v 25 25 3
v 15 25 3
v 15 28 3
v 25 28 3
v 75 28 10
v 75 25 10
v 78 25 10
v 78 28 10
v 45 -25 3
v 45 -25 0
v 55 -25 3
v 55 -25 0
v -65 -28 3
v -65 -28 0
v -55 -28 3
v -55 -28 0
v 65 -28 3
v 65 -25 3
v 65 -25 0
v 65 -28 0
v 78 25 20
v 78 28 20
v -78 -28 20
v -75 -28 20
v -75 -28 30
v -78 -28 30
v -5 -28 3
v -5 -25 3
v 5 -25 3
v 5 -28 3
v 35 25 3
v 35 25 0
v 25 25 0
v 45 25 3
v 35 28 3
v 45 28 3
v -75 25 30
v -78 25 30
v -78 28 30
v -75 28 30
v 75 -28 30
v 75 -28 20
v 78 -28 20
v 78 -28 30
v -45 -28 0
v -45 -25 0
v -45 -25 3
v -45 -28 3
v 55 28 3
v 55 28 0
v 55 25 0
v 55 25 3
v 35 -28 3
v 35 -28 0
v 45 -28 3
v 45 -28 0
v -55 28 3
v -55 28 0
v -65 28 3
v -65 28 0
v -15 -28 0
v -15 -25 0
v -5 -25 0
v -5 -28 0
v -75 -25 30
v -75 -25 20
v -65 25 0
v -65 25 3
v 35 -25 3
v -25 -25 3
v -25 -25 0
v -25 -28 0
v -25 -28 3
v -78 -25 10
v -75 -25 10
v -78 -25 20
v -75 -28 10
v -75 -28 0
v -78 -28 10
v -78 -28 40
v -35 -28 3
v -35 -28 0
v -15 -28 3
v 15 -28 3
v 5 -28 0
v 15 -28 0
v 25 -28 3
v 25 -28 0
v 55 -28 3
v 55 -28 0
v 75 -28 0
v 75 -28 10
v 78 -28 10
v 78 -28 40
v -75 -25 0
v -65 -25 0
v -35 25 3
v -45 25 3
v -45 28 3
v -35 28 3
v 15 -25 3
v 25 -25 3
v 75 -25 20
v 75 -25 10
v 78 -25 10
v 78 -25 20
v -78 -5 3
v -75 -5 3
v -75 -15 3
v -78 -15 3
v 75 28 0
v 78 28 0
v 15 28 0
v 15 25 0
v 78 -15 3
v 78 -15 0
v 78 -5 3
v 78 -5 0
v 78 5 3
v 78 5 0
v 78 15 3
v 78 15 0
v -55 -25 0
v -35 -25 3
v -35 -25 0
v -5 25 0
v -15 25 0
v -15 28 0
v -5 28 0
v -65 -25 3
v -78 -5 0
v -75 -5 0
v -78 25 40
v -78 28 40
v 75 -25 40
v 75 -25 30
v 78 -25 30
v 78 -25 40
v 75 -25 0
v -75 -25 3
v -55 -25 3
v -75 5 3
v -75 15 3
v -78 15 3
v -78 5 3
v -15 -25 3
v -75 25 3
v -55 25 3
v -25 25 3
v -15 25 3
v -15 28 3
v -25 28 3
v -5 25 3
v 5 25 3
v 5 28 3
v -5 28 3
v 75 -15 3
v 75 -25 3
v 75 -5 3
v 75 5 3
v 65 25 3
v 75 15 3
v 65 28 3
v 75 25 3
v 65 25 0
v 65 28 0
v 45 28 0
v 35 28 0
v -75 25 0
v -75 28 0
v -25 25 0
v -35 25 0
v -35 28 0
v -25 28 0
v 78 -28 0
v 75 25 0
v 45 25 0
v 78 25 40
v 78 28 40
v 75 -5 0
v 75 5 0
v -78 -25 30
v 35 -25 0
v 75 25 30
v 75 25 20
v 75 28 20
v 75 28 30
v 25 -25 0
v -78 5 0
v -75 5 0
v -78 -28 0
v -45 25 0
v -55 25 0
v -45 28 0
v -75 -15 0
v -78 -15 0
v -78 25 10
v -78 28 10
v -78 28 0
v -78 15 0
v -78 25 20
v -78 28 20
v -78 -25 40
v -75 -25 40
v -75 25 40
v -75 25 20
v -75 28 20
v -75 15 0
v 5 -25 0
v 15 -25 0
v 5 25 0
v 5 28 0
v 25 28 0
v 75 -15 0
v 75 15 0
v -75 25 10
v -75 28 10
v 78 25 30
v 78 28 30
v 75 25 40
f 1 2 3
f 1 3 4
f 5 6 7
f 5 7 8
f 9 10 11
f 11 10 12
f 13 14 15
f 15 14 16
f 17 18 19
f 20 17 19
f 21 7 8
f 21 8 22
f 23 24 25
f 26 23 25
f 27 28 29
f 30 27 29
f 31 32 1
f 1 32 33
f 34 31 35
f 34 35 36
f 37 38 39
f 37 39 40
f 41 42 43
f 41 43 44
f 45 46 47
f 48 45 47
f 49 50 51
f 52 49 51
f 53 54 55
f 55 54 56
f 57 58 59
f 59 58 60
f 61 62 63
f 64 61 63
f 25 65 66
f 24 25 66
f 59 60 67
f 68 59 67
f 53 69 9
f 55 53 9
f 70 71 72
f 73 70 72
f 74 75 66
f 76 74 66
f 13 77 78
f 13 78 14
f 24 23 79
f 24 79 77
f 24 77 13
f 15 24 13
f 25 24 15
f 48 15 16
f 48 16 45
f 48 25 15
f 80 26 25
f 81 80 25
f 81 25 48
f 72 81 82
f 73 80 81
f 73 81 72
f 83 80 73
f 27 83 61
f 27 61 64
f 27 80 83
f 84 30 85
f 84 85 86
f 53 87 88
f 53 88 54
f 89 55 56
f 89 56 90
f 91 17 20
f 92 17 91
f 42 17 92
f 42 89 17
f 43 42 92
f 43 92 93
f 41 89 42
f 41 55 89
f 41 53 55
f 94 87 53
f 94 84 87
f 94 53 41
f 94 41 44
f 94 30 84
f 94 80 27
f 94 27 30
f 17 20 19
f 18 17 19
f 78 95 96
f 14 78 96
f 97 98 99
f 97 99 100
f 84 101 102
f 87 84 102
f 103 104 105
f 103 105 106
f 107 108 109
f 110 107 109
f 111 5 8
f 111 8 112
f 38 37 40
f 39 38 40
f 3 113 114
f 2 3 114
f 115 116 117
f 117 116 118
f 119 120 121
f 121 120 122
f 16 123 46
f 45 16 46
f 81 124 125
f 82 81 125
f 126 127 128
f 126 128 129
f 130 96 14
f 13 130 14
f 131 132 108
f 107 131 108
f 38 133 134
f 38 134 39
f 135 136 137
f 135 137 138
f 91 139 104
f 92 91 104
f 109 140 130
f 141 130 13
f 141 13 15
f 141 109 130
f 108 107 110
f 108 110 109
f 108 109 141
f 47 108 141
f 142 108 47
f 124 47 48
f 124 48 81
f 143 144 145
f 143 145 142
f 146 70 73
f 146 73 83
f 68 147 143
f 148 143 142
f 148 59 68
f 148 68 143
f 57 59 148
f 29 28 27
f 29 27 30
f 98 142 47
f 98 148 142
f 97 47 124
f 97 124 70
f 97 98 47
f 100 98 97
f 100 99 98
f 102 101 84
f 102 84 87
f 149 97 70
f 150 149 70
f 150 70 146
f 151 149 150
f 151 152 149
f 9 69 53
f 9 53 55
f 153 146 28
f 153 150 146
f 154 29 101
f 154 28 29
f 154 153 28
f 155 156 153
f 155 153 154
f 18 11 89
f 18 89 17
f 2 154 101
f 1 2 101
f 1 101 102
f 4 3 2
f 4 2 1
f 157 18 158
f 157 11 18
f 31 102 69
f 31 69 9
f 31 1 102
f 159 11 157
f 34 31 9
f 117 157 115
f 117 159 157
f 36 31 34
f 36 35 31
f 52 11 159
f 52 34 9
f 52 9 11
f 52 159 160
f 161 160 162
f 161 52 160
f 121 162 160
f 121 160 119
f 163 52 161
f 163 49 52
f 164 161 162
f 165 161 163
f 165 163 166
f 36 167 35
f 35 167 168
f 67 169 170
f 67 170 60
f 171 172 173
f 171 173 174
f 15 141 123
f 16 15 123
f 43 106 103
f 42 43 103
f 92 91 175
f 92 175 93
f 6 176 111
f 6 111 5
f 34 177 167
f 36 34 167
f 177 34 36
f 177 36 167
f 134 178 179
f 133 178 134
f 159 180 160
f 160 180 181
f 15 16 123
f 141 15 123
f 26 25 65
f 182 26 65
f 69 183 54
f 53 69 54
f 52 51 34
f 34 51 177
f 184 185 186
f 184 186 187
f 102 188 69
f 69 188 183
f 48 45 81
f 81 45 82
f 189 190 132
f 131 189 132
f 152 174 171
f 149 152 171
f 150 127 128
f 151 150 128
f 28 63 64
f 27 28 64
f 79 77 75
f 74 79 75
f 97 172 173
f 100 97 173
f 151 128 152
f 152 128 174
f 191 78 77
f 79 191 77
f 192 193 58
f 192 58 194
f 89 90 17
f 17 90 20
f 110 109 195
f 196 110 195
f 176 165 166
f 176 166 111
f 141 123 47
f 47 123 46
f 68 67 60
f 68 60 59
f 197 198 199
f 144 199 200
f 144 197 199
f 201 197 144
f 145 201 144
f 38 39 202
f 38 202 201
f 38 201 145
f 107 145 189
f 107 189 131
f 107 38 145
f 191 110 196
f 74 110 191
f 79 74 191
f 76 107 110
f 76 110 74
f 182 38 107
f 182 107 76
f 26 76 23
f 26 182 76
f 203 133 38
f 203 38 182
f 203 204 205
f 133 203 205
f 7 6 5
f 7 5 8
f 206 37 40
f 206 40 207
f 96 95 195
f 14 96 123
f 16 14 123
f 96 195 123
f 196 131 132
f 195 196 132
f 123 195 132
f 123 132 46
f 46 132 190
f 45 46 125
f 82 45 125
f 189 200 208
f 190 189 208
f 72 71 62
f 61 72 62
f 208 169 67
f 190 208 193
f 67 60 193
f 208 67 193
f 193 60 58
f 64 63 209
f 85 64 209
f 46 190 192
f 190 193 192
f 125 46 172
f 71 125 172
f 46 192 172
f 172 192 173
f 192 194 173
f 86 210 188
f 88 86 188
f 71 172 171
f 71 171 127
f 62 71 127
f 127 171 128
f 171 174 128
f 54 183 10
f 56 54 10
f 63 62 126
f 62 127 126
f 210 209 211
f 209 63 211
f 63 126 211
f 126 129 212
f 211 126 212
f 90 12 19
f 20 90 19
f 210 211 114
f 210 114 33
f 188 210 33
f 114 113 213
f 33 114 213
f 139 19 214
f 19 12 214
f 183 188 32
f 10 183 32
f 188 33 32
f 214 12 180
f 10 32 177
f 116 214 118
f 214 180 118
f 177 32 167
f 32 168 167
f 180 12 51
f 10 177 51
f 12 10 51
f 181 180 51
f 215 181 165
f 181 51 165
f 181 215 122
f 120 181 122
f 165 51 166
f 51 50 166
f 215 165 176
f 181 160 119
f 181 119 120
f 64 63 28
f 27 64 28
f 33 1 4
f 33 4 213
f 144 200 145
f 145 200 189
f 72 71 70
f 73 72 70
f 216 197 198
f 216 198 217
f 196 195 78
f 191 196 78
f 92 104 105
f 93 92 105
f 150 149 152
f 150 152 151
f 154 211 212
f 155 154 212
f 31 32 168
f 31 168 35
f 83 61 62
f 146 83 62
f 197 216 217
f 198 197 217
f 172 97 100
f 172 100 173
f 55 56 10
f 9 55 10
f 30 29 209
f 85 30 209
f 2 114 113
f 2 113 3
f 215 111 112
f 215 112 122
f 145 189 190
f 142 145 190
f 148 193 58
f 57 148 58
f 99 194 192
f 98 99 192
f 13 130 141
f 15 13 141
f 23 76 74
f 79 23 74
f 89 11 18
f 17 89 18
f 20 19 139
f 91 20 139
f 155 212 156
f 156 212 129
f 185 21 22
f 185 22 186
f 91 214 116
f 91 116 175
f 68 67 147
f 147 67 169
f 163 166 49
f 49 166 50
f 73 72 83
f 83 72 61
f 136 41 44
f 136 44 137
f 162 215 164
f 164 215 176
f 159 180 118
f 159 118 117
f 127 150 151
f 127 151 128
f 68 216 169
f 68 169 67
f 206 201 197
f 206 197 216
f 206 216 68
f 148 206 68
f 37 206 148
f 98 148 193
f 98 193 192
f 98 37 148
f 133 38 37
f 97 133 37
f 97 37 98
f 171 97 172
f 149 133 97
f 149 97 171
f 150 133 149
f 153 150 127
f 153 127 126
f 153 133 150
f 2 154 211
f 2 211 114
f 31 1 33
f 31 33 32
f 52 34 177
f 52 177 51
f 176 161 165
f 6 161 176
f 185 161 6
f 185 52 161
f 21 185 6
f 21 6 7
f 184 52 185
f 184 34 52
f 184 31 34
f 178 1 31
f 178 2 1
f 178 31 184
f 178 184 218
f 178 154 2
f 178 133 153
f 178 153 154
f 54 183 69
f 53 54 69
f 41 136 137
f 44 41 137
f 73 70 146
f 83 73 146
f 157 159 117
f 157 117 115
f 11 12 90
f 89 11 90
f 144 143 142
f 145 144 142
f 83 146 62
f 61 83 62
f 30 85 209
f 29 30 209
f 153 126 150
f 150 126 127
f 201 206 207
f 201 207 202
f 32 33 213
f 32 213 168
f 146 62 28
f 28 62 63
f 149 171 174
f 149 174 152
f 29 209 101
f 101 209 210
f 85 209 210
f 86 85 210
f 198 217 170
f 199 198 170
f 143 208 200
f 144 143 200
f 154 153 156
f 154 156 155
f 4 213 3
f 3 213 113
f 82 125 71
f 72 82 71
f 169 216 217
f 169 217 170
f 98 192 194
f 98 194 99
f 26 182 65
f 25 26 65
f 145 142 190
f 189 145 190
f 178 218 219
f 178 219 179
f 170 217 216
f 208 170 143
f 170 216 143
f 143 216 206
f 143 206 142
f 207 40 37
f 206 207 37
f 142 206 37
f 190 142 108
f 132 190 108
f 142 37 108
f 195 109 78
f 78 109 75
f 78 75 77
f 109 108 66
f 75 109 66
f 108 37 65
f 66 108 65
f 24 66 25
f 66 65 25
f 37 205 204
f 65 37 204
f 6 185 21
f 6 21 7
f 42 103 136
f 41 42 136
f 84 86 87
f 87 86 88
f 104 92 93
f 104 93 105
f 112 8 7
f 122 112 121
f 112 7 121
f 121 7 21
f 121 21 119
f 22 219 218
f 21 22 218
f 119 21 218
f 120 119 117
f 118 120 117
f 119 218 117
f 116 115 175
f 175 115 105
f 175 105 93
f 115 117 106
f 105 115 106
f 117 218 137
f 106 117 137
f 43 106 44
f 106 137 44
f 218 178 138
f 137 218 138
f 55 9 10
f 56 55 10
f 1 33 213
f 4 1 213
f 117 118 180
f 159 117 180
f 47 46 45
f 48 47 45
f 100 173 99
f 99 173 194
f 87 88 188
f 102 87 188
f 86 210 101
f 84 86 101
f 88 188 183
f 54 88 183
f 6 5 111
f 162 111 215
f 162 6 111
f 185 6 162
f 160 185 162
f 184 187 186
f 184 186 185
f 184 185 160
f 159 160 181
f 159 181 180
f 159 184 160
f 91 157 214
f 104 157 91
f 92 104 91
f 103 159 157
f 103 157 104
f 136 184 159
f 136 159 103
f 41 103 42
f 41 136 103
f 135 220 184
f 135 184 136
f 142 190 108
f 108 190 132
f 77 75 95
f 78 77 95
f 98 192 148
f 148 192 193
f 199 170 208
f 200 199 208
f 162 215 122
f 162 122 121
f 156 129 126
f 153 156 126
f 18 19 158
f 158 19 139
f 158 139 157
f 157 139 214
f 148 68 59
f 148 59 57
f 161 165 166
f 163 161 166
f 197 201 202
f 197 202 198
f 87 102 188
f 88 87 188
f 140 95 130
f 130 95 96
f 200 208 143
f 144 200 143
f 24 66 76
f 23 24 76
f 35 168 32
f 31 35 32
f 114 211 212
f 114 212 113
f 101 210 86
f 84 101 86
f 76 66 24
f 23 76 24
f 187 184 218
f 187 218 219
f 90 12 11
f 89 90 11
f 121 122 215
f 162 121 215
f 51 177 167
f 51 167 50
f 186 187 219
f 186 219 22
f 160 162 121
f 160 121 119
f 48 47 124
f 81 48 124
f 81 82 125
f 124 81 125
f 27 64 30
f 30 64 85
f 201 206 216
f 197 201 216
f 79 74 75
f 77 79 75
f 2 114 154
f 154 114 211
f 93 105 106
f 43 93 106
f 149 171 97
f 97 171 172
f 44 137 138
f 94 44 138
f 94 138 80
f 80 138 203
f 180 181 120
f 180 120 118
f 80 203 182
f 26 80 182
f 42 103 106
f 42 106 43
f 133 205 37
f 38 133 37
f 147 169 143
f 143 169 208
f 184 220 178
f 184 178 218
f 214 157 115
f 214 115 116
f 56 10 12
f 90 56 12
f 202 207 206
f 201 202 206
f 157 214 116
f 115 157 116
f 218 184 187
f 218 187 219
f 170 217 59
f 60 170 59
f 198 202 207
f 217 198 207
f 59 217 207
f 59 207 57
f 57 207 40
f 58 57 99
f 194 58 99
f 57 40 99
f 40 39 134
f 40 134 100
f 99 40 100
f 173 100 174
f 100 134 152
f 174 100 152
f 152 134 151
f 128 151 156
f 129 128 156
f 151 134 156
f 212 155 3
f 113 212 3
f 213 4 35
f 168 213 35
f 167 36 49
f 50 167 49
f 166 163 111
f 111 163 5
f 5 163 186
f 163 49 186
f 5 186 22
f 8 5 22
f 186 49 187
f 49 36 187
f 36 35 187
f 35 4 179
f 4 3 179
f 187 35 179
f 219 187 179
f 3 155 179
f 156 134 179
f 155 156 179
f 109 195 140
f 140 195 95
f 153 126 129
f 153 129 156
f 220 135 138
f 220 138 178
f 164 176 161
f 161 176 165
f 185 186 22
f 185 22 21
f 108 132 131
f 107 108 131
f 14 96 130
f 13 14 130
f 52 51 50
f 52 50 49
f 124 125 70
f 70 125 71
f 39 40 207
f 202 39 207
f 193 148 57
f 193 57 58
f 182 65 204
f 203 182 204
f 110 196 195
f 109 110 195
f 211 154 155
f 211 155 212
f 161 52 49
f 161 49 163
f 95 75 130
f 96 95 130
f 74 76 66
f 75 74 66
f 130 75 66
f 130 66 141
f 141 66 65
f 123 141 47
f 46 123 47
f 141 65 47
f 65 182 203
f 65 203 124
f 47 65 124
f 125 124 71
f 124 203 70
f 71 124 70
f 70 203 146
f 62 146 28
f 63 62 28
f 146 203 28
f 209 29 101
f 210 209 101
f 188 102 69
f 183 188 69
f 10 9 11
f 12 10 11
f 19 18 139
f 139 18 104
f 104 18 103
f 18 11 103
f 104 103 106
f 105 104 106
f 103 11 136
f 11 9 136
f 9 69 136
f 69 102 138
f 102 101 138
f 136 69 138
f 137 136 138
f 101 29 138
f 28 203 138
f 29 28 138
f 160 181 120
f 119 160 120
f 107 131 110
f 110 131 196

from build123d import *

# Parameters (mm, degrees)
F1_DEPTH = 3
F3_DEPTH = 3
F5_DEPTH = 3


with BuildPart() as f1:
    # F0 (on Top) → F1 (new body)
    with BuildSketch(Plane.XY):
        Polygon((-75, -15), (-75, -25), (-65, -25), (-65, -28), (-55, -28), (-55, -25), (-45, -25), (-45, -28), (-35, -28), (-35, -25), (-25, -25), (-25, -28), (-15, -28), (-15, -25), (-5, -25), (-5, -28), (5, -28), (5, -25), (15, -25), (15, -28), (25, -28), (25, -25), (35, -25), (35, -28), (45, -28), (45, -25), (55, -25), (55, -28), (65, -28), (65, -25), (75, -25), (75, -15), (78, -15), (78, -5), (75, -5), (75, 5), (78, 5), (78, 15), (75, 15), (75, 25), (65, 25), (65, 28), (55, 28), (55, 25), (45, 25), (45, 28), (35, 28), (35, 25), (25, 25), (25, 28), (15, 28), (15, 25), (5, 25), (5, 28), (-5, 28), (-5, 25), (-15, 25), (-15, 28), (-25, 28), (-25, 25), (-35, 25), (-35, 28), (-45, 28), (-45, 25), (-55, 25), (-55, 28), (-65, 28), (-65, 25), (-75, 25), (-75, 15), (-78, 15), (-78, 5), (-75, 5), (-75, -5), (-78, -5), (-78, -15), align=None)
    extrude(amount=F1_DEPTH)


with BuildPart() as f3:
    # F2 (on face) → F3 (new body)
    with BuildSketch(Plane(origin=(-75, 0, 0), x_dir=(0, -1, 0), z_dir=(-1, 0, 0))):
        Polygon((-28, 0), (-15, 0), (-15, 3), (-5, 3), (-5, 0), (5, 0), (5, 3), (15, 3), (15, 0), (28, 0), (28, 10), (25, 10), (25, 20), (28, 20), (28, 30), (25, 30), (25, 40), (-25, 40), (-25, 30), (-28, 30), (-28, 20), (-25, 20), (-25, 10), (-28, 10), align=None)
    extrude(amount=F3_DEPTH)


with BuildPart() as f5:
    # F4 (on face) → F5 (new body)
    with BuildSketch(Plane.XZ.offset(25)):
        Polygon((-75, 10), (-75, 0), (-65, 0), (-65, 3), (-55, 3), (-55, 0), (-45, 0), (-45, 3), (-35, 3), (-35, 0), (-25, 0), (-25, 3), (-15, 3), (-15, 0), (-5, 0), (-5, 3), (5, 3), (5, 0), (15, 0), (15, 3), (25, 3), (25, 0), (35, 0), (35, 3), (45, 3), (45, 0), (55, 0), (55, 3), (65, 3), (65, 0), (75, 0), (75, 3), (75, 10), (78, 10), (78, 20), (75, 20), (75, 30), (78, 30), (78, 40), (-78, 40), (-78, 30), (-75, 30), (-75, 20), (-78, 20), (-78, 10), align=None)
    extrude(amount=F5_DEPTH)


with BuildPart() as f6_1:
    # F6: instance of F3
    add(f3.part.mirror(Plane.YZ))


with BuildPart() as f7_1:
    # F7: instance of F5
    add(f5.part.mirror(Plane.XZ))


solid = Compound([f1.part, f3.part, f5.part, f6_1.part, f7_1.part])
